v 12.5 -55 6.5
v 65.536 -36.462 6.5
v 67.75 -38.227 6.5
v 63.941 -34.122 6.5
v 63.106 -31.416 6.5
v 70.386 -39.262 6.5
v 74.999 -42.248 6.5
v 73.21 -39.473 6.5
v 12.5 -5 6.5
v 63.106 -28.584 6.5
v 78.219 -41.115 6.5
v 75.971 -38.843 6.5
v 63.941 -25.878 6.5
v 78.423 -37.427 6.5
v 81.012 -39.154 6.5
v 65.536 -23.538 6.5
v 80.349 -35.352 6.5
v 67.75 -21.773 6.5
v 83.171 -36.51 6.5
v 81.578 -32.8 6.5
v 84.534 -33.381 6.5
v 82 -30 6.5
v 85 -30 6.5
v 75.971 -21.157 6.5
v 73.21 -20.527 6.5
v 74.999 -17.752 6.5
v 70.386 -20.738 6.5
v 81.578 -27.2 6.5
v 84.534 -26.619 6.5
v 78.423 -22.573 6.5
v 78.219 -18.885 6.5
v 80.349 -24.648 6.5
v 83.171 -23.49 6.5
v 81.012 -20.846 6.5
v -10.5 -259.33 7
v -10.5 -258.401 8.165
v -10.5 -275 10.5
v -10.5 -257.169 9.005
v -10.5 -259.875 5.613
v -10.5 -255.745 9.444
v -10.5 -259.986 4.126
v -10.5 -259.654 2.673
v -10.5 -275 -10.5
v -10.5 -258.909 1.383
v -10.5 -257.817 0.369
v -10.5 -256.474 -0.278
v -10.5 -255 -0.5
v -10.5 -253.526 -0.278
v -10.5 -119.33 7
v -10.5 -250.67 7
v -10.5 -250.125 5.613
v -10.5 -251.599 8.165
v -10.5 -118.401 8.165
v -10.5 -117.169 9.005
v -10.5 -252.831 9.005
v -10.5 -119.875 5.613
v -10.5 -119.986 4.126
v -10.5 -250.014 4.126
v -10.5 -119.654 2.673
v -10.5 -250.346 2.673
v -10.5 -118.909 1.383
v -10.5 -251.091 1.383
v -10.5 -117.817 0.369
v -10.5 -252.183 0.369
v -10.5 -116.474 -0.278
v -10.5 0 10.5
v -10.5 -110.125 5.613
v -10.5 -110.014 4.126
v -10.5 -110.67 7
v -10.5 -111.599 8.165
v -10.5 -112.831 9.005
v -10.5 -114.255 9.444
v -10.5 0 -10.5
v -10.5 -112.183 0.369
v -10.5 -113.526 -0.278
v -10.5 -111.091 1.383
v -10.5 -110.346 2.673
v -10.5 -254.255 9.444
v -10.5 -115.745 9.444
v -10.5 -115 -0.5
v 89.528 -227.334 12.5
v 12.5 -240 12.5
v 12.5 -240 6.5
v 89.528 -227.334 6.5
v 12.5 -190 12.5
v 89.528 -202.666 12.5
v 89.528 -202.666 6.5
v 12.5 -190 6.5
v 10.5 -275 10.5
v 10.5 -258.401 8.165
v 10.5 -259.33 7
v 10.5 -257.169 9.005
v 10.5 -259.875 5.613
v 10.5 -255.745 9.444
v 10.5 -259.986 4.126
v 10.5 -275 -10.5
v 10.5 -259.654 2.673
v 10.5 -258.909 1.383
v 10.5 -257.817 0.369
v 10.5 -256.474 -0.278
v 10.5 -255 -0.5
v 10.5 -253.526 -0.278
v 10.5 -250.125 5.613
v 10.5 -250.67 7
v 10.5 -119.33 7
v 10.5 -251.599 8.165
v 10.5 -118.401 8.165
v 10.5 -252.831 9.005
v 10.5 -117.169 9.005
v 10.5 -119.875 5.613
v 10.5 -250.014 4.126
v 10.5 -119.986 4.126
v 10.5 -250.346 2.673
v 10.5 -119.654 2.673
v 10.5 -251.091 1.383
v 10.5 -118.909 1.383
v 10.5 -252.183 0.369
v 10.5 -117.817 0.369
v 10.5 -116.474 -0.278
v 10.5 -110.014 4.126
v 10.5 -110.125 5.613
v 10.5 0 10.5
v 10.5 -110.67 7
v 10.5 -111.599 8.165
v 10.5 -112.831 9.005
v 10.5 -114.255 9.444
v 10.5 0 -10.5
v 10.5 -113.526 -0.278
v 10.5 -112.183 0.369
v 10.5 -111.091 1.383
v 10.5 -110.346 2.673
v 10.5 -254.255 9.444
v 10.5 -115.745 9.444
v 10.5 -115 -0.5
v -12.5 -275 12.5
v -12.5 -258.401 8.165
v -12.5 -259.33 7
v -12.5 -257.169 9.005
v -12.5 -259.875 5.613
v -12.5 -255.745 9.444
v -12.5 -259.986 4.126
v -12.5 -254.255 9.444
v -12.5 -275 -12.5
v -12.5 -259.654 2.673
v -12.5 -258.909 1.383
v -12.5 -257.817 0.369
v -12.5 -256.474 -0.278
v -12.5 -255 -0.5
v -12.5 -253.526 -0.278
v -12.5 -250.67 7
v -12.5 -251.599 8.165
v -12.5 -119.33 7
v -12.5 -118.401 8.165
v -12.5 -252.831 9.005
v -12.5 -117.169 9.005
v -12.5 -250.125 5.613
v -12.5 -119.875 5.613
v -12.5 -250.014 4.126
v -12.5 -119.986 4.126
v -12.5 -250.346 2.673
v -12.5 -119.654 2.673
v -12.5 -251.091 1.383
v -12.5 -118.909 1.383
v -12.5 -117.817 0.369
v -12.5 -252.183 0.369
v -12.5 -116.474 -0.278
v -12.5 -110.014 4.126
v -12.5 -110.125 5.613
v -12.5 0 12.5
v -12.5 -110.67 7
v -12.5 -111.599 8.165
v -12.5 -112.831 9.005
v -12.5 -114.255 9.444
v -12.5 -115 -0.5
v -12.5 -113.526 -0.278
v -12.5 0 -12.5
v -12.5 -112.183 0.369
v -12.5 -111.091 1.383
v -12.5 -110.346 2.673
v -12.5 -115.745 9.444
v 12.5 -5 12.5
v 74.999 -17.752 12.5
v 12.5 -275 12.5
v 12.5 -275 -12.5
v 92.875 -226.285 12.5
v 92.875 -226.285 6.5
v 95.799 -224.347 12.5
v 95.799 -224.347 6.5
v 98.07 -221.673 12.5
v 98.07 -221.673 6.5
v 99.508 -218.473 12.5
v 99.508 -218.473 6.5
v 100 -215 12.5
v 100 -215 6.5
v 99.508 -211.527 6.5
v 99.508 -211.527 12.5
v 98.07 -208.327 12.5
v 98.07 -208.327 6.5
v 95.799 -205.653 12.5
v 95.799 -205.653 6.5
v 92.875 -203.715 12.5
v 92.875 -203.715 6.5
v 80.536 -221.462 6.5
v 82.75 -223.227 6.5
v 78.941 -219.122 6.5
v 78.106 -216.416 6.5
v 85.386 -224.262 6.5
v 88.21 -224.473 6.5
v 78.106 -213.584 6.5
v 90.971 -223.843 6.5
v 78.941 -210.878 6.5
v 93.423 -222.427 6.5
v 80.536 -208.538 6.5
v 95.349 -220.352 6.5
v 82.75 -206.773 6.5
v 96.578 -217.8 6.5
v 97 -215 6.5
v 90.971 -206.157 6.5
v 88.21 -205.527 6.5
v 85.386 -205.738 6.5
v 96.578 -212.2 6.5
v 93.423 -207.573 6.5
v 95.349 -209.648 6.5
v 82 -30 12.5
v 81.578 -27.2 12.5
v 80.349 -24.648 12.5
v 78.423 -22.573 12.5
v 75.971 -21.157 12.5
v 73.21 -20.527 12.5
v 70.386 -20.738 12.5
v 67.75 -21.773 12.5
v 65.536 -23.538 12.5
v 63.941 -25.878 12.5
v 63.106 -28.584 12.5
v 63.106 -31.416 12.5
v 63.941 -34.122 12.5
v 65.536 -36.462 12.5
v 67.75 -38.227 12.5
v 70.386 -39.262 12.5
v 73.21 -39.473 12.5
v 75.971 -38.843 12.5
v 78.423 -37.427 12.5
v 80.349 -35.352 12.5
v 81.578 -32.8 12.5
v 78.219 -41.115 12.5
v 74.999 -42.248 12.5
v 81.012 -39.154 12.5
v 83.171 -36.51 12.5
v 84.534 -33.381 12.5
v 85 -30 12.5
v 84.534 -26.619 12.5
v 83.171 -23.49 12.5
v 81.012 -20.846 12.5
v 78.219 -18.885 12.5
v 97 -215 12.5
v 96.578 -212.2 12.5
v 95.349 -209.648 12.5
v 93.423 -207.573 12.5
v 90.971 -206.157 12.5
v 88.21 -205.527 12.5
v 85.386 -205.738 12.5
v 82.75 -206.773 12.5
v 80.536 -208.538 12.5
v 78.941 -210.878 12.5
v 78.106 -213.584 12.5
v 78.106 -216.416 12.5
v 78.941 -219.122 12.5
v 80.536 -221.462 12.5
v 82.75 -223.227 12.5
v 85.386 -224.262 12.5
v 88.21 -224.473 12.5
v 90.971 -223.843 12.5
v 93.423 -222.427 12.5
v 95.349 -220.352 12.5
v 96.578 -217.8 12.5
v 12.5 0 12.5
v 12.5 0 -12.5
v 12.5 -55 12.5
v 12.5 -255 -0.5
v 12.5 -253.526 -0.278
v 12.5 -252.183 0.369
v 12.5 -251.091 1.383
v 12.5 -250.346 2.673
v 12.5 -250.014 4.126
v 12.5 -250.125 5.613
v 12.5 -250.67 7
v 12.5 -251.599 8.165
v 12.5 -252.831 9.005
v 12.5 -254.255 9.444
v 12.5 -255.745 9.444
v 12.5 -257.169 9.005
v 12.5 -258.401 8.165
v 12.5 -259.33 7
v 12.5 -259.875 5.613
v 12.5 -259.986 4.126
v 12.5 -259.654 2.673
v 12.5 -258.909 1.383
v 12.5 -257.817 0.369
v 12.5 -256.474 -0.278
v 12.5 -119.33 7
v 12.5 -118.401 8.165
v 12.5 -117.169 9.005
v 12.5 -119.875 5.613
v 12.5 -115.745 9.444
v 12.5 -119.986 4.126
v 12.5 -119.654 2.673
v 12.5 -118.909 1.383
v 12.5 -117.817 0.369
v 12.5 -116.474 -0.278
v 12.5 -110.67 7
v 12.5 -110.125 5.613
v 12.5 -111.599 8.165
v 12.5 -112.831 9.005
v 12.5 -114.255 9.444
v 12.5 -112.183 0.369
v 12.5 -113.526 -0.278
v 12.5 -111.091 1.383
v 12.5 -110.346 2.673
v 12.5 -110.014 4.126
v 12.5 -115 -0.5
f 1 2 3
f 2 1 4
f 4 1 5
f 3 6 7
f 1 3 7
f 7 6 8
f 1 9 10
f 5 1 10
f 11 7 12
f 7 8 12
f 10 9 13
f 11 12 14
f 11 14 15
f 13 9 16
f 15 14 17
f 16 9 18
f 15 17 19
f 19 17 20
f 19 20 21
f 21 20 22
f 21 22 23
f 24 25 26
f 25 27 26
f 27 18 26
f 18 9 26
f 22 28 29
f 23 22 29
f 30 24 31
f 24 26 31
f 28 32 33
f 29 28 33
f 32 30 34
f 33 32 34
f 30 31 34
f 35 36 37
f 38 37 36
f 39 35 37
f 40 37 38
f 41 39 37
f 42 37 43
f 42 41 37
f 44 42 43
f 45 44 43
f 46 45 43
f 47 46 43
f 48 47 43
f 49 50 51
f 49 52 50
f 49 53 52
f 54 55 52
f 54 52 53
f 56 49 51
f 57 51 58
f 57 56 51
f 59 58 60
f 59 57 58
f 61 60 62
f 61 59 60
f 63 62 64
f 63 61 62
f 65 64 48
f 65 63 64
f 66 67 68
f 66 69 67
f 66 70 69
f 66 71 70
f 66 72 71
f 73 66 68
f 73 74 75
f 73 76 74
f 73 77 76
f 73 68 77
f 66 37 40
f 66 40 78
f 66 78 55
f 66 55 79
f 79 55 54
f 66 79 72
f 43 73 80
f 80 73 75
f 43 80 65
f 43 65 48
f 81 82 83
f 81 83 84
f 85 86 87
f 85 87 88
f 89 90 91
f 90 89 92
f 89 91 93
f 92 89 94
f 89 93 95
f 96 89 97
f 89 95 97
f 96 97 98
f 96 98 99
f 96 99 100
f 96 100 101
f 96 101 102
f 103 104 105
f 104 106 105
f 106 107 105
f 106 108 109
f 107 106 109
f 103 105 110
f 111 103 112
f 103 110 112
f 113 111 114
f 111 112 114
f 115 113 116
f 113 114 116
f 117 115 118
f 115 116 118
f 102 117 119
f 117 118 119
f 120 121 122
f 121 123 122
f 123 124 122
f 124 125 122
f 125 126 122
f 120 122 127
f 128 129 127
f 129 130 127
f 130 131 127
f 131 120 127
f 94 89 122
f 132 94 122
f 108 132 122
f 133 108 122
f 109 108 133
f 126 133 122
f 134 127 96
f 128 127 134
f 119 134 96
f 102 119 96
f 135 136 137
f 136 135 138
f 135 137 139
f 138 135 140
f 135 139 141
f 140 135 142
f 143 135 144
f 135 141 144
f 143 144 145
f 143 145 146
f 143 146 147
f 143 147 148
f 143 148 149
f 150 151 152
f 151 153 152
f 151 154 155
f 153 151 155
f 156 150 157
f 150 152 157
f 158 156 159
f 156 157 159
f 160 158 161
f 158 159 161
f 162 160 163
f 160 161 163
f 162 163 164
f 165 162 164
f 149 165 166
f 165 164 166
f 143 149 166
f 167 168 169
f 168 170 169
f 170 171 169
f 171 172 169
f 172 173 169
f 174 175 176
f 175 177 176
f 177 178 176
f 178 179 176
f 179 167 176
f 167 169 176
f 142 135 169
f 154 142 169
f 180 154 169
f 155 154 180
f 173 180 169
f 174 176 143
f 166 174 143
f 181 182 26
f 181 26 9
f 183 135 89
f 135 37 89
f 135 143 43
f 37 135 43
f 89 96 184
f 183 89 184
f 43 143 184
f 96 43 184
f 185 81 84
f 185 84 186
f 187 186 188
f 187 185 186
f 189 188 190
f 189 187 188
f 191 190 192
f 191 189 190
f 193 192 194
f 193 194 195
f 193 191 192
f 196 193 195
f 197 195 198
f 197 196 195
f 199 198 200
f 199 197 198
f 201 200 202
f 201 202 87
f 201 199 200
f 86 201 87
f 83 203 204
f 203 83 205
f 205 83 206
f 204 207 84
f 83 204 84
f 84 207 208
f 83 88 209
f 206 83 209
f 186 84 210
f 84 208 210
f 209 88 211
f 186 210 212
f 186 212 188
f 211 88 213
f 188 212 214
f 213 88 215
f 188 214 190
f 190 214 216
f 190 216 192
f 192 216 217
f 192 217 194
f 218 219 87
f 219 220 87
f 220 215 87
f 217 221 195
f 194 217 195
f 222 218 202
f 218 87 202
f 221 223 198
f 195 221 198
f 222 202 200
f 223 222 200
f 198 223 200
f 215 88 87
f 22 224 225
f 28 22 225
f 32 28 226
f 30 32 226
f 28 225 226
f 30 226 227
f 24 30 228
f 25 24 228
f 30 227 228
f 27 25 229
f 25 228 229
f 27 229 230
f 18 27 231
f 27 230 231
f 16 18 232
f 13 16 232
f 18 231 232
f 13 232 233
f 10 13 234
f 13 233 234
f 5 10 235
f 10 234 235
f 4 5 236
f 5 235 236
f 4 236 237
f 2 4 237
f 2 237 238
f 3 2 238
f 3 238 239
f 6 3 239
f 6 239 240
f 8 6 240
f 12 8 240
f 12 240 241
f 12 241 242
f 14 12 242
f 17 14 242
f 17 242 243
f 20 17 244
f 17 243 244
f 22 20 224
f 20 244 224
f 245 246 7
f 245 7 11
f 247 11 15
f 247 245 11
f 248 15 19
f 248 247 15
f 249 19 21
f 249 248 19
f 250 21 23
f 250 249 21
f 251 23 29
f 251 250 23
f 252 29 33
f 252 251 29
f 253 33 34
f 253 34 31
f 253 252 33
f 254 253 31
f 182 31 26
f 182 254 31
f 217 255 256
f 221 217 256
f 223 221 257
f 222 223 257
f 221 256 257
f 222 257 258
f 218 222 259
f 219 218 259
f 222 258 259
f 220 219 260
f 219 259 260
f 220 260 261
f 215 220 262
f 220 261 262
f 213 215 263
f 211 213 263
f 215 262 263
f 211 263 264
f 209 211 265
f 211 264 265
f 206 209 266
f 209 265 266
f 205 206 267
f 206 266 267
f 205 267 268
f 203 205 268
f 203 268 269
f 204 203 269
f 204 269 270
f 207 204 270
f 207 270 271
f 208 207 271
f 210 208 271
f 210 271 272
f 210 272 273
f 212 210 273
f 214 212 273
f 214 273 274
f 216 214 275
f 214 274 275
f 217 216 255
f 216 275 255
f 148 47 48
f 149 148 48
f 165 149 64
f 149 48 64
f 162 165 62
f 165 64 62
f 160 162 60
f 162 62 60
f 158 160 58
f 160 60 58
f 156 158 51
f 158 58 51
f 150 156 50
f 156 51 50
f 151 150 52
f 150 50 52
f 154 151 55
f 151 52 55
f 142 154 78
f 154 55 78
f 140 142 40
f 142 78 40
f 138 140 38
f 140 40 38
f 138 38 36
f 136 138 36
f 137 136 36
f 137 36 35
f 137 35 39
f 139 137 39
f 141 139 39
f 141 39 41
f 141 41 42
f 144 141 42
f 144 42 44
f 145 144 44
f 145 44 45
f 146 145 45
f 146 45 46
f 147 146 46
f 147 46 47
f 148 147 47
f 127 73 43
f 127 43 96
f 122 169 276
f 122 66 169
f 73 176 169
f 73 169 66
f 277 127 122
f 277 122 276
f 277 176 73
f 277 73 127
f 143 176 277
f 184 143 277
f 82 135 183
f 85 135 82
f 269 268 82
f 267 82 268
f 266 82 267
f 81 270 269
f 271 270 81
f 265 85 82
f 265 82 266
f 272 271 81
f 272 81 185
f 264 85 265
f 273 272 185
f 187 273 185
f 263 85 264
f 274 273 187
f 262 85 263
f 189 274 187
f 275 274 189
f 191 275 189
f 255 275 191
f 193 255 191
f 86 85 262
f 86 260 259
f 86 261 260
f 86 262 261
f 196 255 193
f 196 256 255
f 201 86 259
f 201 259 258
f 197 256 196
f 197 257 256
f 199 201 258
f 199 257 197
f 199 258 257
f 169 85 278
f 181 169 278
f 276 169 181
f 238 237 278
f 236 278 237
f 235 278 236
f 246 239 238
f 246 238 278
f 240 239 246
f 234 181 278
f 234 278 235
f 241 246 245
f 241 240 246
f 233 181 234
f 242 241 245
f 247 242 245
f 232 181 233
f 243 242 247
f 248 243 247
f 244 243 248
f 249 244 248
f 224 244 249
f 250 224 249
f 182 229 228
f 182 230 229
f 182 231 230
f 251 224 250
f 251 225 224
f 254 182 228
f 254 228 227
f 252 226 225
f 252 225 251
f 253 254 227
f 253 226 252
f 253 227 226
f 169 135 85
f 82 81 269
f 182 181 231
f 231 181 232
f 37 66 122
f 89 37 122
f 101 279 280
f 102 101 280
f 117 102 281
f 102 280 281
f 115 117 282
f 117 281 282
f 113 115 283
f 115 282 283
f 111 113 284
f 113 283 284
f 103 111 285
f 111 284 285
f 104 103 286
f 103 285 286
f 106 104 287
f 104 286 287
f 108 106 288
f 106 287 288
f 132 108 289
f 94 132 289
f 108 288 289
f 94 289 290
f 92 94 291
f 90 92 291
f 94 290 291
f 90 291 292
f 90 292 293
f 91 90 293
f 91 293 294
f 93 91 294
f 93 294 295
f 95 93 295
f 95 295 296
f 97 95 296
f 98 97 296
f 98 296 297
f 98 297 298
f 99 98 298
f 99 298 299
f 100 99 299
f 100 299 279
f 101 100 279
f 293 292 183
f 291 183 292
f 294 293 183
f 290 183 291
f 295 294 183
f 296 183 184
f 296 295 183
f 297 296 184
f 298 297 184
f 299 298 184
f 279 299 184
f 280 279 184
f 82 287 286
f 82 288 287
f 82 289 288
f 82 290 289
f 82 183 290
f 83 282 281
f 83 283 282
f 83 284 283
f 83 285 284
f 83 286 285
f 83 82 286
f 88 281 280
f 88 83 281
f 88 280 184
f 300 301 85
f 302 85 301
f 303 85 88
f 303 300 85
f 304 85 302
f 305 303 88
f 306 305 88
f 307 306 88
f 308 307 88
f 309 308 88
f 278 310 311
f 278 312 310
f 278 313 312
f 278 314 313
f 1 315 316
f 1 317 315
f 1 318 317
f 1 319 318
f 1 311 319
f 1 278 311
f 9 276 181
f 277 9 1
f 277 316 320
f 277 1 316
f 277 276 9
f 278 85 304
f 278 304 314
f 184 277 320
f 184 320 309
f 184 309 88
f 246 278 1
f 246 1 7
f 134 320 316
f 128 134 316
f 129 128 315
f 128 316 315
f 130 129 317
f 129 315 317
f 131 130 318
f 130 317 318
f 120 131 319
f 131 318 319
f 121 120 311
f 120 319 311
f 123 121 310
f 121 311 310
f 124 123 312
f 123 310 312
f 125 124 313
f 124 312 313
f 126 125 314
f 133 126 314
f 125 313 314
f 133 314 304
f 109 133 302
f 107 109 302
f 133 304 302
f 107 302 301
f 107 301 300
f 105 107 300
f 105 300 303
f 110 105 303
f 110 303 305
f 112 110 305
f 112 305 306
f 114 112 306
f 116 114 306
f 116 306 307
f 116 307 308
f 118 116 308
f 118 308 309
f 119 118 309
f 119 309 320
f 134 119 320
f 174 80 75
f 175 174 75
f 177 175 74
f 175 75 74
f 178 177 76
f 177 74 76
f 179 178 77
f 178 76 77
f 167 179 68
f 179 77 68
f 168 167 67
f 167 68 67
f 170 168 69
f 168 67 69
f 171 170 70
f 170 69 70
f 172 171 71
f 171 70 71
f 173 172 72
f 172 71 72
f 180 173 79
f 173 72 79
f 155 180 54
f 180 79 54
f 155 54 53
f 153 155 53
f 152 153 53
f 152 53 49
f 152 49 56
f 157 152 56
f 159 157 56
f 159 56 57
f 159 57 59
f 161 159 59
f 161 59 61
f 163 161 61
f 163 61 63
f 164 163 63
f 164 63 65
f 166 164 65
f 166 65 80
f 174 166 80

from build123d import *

# Parameters (mm, degrees)
SKETCH1_W           = 25
SKETCH1_H           = 25
SKETCH1_W_2         = 21
SKETCH1_H_2         = 21
BOSS_EXTRUDE1_DEPTH = 275
SKETCH2_R           = 9.5
BOSS_EXTRUDE2_DEPTH = 6
CUT_EXTRUDE1_REACH  = 290.856
SKETCH3_R           = 5


with BuildPart() as part:
    # Sketch1 → Boss-Extrude1 (new body)
    with BuildSketch(Plane(origin=(0, 0, 0), x_dir=(1, 0, 0), z_dir=(0, 1, 0))):
        Rectangle(SKETCH1_W, SKETCH1_H)
        Rectangle(SKETCH1_W_2, SKETCH1_H_2, mode=Mode.SUBTRACT)
    extrude(amount=-BOSS_EXTRUDE1_DEPTH)

    # Sketch2 → Boss-Extrude2 (add)
    # profile 1 of 2: a face of its own
    with BuildSketch(Plane.XY.offset(12.5)):
        with BuildLine():
            Line((74.999020274, -17.752351341), (12.5, -5))
            Line((12.5, -5), (12.5, -55))
            Line((12.5, -55), (74.999020274, -42.247648659))
            ThreePointArc((74.999020274, -42.247648659), (85, -30), (74.999020274, -17.752351341))
        make_face()
        with Locations((72.5, -30)):
            Circle(SKETCH2_R, mode=Mode.SUBTRACT)
    # profile 2 of 2: a face of its own
    with BuildSketch(Plane.XY.offset(12.5)):
        with BuildLine():
            Line((89.528123749, -202.665628753), (12.5, -190))
            Line((12.5, -190), (12.5, -240))
            Line((12.5, -240), (89.528123749, -227.334371247))
            ThreePointArc((89.528123749, -227.334371247), (100, -215), (89.528123749, -202.665628753))
        make_face()
        with Locations((87.5, -215)):
            Circle(SKETCH2_R, mode=Mode.SUBTRACT)
    extrude(amount=-BOSS_EXTRUDE2_DEPTH)

    # Cut-Extrude1: up to this face of the body (flat: up to its plane)
    cut_extrude1_end = Plane(part.part.faces().sort_by_distance((-12.5, -137.5, 0))[0])
    # Sketch3 → Cut-Extrude1 (cut, up to the picked face)
    with BuildSketch(Plane(origin=(12.5, 0, 0), x_dir=(0, 0, -1), z_dir=(1, 0, 0)), mode=Mode.PRIVATE) as cut_extrude1_sk1:
        with Locations((-4.5, -115)):
            Circle(SKETCH3_R)
    cut_extrude1_tool1 = split(extrude(cut_extrude1_sk1.sketch, amount=-CUT_EXTRUDE1_REACH, mode=Mode.PRIVATE), bisect_by=cut_extrude1_end, keep=Keep.BOTH, mode=Mode.PRIVATE)
    # Sketch3 → Cut-Extrude1 (cut, up to the picked face)
    with BuildSketch(Plane(origin=(12.5, 0, 0), x_dir=(0, 0, -1), z_dir=(1, 0, 0)), mode=Mode.PRIVATE) as cut_extrude1_sk2:
        with Locations((-4.5, -255)):
            Circle(SKETCH3_R)
    cut_extrude1_tool2 = split(extrude(cut_extrude1_sk2.sketch, amount=-CUT_EXTRUDE1_REACH, mode=Mode.PRIVATE), bisect_by=cut_extrude1_end, keep=Keep.BOTH, mode=Mode.PRIVATE)
    add(cut_extrude1_tool1.solids().sort_by(Axis((12.5, -115, 4.5), (-1, 0, 0)))[0], mode=Mode.SUBTRACT)
    add(cut_extrude1_tool2.solids().sort_by(Axis((12.5, -255, 4.5), (-1, 0, 0)))[0], mode=Mode.SUBTRACT)


solid = part.part
